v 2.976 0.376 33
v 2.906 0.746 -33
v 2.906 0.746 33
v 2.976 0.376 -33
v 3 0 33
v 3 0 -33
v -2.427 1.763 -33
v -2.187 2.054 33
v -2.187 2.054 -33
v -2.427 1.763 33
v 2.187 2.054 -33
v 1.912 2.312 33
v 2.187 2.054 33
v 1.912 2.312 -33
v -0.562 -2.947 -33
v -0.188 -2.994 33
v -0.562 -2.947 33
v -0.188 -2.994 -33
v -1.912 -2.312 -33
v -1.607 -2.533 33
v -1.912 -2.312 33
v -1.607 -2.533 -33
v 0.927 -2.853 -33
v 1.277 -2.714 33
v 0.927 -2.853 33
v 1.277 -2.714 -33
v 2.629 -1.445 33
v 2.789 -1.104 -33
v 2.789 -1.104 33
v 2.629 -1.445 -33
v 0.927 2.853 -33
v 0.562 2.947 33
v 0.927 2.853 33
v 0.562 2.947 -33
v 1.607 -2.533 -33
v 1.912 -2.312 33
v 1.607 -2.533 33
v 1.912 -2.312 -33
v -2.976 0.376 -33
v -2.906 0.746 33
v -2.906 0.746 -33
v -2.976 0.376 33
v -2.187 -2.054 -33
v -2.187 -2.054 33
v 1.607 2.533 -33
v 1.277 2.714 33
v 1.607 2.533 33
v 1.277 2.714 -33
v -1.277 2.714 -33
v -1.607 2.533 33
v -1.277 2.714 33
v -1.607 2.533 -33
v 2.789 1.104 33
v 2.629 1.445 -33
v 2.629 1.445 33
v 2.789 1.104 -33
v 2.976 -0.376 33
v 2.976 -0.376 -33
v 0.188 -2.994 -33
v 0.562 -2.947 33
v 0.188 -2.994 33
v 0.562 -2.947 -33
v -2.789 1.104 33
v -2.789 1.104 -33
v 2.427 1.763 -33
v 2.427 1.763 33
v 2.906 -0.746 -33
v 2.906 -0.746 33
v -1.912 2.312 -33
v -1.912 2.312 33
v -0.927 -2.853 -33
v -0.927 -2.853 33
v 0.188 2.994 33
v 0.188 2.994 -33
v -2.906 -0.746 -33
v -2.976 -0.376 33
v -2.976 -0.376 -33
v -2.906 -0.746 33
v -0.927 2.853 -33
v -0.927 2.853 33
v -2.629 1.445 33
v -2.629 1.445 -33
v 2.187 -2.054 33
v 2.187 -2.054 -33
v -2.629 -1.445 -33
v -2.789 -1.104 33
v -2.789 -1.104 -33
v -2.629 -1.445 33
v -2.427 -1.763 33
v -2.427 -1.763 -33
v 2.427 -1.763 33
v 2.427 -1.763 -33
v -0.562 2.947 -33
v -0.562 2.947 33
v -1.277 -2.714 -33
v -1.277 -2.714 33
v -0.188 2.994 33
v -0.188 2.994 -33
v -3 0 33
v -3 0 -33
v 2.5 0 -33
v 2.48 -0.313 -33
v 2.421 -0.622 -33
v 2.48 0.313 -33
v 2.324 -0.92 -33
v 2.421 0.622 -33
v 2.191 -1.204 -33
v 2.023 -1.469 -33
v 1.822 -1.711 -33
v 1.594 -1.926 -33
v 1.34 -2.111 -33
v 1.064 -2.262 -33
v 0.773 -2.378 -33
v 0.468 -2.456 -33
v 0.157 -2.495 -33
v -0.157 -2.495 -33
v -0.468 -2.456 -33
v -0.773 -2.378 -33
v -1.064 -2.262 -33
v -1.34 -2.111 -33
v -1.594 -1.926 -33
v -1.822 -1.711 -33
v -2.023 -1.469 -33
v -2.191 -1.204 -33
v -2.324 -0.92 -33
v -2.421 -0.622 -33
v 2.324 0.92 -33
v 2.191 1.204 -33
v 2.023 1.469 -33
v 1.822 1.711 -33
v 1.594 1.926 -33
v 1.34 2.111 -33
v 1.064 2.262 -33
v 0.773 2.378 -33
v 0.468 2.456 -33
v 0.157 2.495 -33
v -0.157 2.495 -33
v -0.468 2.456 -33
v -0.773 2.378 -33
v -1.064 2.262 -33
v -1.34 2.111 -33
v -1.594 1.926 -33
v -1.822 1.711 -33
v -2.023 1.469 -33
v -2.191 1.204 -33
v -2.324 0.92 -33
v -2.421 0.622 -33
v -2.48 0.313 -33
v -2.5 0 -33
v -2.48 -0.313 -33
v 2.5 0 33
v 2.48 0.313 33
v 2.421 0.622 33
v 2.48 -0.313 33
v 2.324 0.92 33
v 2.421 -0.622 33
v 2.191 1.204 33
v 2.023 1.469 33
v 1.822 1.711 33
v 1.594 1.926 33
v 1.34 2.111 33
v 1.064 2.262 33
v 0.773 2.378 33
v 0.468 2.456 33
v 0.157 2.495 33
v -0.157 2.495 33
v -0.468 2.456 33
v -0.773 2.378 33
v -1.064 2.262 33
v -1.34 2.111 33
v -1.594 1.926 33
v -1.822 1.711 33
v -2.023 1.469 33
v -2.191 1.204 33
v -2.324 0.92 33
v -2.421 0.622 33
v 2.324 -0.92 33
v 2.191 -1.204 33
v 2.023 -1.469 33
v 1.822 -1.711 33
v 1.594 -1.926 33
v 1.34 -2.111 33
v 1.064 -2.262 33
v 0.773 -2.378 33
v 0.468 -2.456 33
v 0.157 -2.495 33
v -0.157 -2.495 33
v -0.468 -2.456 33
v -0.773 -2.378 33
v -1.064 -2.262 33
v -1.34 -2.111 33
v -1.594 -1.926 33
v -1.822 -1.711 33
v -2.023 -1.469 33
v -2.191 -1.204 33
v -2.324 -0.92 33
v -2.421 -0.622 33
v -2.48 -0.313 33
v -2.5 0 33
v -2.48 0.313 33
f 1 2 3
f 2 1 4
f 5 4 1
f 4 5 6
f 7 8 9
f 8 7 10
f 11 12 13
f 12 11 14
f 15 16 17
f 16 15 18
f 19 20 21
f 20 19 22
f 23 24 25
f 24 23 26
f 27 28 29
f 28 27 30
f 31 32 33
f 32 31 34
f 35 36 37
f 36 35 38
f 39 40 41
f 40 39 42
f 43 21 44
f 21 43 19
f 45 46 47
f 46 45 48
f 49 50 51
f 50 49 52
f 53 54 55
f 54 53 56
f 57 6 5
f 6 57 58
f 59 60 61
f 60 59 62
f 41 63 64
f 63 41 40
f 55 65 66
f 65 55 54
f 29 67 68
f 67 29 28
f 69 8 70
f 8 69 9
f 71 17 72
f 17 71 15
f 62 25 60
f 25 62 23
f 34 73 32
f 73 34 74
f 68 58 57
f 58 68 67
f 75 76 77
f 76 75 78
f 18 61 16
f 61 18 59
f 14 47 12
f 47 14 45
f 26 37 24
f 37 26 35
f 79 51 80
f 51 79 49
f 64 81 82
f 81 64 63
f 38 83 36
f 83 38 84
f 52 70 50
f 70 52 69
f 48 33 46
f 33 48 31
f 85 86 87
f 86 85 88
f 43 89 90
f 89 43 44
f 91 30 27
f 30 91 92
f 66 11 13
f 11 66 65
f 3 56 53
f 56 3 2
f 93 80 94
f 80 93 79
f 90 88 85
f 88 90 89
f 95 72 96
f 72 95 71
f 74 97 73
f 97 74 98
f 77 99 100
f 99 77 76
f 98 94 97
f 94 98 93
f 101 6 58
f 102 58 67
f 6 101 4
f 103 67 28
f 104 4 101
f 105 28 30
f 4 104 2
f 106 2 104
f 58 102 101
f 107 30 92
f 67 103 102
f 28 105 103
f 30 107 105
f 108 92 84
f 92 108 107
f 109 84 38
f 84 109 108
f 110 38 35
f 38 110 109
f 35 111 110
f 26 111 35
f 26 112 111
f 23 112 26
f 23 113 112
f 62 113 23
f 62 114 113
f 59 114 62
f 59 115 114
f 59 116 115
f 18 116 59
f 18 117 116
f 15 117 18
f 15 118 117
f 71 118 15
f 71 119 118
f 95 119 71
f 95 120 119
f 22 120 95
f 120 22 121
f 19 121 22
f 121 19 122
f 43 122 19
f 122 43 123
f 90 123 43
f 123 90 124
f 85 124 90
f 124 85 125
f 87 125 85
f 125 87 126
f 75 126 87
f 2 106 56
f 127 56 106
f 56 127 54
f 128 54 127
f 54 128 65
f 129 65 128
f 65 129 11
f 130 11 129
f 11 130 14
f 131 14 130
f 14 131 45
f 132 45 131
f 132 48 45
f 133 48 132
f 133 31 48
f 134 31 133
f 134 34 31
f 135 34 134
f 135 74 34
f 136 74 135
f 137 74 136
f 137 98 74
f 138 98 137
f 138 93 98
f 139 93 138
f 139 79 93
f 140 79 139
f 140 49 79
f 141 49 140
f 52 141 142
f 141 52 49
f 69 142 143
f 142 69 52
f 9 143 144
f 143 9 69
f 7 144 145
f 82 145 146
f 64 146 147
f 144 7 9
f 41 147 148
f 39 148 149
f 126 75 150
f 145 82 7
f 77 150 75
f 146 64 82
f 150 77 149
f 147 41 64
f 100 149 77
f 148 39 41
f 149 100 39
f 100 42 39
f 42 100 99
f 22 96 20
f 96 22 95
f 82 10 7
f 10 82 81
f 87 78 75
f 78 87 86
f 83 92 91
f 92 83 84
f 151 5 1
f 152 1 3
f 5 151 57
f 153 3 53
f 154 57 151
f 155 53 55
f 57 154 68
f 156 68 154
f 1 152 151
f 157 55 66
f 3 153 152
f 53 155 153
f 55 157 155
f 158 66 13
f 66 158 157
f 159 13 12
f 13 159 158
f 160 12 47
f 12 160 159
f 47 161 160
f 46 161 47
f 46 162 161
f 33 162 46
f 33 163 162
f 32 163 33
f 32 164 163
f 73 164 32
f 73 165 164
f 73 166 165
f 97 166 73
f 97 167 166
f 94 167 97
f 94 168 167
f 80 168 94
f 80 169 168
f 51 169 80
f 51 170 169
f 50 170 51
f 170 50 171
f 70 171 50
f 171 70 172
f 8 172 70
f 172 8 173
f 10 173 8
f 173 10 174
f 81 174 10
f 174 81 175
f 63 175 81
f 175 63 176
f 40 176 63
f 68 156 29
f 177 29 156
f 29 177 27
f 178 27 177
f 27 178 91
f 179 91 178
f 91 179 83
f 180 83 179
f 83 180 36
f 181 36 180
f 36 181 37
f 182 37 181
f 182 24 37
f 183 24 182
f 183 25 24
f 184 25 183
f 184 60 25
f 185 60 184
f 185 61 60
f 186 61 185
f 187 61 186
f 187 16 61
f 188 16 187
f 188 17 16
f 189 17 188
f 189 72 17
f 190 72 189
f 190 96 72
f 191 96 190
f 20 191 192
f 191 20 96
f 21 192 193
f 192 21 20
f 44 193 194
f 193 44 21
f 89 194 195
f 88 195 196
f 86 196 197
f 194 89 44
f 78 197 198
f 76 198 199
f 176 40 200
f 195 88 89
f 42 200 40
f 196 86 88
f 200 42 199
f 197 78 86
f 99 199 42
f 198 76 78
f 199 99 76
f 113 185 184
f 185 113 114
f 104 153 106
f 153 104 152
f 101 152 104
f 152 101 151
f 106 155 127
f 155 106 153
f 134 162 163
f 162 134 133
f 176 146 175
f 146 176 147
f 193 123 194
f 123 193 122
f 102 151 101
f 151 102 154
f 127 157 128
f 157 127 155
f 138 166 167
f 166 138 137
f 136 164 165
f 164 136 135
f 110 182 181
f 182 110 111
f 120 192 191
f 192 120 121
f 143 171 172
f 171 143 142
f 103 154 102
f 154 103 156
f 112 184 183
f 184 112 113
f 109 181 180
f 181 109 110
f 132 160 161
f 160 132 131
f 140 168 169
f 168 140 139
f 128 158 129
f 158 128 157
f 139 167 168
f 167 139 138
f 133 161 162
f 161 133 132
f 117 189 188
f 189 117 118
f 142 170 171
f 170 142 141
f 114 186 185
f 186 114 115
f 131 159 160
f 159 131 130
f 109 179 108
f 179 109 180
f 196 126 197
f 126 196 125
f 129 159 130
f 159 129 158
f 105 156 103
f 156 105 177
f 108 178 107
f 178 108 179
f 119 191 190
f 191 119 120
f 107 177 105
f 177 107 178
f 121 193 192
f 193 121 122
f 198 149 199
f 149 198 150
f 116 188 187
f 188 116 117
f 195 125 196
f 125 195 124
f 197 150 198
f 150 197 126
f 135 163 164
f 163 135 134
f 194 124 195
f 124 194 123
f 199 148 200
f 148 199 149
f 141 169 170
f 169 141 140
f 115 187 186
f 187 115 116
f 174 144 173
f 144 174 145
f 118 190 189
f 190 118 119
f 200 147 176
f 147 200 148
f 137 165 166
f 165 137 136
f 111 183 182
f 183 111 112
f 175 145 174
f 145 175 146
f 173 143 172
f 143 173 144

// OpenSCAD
$fn = 50;


difference() {
	union() {
		translate(v = [0, 0, -33.0000000000]) {
			cylinder(h = 66, r = 3.0000000000);
		}
	}
	union() {
		translate(v = [0, 0, -100.0000000000]) {
			cylinder(h = 200, r = 2.5000000000);
		}
	}
}
